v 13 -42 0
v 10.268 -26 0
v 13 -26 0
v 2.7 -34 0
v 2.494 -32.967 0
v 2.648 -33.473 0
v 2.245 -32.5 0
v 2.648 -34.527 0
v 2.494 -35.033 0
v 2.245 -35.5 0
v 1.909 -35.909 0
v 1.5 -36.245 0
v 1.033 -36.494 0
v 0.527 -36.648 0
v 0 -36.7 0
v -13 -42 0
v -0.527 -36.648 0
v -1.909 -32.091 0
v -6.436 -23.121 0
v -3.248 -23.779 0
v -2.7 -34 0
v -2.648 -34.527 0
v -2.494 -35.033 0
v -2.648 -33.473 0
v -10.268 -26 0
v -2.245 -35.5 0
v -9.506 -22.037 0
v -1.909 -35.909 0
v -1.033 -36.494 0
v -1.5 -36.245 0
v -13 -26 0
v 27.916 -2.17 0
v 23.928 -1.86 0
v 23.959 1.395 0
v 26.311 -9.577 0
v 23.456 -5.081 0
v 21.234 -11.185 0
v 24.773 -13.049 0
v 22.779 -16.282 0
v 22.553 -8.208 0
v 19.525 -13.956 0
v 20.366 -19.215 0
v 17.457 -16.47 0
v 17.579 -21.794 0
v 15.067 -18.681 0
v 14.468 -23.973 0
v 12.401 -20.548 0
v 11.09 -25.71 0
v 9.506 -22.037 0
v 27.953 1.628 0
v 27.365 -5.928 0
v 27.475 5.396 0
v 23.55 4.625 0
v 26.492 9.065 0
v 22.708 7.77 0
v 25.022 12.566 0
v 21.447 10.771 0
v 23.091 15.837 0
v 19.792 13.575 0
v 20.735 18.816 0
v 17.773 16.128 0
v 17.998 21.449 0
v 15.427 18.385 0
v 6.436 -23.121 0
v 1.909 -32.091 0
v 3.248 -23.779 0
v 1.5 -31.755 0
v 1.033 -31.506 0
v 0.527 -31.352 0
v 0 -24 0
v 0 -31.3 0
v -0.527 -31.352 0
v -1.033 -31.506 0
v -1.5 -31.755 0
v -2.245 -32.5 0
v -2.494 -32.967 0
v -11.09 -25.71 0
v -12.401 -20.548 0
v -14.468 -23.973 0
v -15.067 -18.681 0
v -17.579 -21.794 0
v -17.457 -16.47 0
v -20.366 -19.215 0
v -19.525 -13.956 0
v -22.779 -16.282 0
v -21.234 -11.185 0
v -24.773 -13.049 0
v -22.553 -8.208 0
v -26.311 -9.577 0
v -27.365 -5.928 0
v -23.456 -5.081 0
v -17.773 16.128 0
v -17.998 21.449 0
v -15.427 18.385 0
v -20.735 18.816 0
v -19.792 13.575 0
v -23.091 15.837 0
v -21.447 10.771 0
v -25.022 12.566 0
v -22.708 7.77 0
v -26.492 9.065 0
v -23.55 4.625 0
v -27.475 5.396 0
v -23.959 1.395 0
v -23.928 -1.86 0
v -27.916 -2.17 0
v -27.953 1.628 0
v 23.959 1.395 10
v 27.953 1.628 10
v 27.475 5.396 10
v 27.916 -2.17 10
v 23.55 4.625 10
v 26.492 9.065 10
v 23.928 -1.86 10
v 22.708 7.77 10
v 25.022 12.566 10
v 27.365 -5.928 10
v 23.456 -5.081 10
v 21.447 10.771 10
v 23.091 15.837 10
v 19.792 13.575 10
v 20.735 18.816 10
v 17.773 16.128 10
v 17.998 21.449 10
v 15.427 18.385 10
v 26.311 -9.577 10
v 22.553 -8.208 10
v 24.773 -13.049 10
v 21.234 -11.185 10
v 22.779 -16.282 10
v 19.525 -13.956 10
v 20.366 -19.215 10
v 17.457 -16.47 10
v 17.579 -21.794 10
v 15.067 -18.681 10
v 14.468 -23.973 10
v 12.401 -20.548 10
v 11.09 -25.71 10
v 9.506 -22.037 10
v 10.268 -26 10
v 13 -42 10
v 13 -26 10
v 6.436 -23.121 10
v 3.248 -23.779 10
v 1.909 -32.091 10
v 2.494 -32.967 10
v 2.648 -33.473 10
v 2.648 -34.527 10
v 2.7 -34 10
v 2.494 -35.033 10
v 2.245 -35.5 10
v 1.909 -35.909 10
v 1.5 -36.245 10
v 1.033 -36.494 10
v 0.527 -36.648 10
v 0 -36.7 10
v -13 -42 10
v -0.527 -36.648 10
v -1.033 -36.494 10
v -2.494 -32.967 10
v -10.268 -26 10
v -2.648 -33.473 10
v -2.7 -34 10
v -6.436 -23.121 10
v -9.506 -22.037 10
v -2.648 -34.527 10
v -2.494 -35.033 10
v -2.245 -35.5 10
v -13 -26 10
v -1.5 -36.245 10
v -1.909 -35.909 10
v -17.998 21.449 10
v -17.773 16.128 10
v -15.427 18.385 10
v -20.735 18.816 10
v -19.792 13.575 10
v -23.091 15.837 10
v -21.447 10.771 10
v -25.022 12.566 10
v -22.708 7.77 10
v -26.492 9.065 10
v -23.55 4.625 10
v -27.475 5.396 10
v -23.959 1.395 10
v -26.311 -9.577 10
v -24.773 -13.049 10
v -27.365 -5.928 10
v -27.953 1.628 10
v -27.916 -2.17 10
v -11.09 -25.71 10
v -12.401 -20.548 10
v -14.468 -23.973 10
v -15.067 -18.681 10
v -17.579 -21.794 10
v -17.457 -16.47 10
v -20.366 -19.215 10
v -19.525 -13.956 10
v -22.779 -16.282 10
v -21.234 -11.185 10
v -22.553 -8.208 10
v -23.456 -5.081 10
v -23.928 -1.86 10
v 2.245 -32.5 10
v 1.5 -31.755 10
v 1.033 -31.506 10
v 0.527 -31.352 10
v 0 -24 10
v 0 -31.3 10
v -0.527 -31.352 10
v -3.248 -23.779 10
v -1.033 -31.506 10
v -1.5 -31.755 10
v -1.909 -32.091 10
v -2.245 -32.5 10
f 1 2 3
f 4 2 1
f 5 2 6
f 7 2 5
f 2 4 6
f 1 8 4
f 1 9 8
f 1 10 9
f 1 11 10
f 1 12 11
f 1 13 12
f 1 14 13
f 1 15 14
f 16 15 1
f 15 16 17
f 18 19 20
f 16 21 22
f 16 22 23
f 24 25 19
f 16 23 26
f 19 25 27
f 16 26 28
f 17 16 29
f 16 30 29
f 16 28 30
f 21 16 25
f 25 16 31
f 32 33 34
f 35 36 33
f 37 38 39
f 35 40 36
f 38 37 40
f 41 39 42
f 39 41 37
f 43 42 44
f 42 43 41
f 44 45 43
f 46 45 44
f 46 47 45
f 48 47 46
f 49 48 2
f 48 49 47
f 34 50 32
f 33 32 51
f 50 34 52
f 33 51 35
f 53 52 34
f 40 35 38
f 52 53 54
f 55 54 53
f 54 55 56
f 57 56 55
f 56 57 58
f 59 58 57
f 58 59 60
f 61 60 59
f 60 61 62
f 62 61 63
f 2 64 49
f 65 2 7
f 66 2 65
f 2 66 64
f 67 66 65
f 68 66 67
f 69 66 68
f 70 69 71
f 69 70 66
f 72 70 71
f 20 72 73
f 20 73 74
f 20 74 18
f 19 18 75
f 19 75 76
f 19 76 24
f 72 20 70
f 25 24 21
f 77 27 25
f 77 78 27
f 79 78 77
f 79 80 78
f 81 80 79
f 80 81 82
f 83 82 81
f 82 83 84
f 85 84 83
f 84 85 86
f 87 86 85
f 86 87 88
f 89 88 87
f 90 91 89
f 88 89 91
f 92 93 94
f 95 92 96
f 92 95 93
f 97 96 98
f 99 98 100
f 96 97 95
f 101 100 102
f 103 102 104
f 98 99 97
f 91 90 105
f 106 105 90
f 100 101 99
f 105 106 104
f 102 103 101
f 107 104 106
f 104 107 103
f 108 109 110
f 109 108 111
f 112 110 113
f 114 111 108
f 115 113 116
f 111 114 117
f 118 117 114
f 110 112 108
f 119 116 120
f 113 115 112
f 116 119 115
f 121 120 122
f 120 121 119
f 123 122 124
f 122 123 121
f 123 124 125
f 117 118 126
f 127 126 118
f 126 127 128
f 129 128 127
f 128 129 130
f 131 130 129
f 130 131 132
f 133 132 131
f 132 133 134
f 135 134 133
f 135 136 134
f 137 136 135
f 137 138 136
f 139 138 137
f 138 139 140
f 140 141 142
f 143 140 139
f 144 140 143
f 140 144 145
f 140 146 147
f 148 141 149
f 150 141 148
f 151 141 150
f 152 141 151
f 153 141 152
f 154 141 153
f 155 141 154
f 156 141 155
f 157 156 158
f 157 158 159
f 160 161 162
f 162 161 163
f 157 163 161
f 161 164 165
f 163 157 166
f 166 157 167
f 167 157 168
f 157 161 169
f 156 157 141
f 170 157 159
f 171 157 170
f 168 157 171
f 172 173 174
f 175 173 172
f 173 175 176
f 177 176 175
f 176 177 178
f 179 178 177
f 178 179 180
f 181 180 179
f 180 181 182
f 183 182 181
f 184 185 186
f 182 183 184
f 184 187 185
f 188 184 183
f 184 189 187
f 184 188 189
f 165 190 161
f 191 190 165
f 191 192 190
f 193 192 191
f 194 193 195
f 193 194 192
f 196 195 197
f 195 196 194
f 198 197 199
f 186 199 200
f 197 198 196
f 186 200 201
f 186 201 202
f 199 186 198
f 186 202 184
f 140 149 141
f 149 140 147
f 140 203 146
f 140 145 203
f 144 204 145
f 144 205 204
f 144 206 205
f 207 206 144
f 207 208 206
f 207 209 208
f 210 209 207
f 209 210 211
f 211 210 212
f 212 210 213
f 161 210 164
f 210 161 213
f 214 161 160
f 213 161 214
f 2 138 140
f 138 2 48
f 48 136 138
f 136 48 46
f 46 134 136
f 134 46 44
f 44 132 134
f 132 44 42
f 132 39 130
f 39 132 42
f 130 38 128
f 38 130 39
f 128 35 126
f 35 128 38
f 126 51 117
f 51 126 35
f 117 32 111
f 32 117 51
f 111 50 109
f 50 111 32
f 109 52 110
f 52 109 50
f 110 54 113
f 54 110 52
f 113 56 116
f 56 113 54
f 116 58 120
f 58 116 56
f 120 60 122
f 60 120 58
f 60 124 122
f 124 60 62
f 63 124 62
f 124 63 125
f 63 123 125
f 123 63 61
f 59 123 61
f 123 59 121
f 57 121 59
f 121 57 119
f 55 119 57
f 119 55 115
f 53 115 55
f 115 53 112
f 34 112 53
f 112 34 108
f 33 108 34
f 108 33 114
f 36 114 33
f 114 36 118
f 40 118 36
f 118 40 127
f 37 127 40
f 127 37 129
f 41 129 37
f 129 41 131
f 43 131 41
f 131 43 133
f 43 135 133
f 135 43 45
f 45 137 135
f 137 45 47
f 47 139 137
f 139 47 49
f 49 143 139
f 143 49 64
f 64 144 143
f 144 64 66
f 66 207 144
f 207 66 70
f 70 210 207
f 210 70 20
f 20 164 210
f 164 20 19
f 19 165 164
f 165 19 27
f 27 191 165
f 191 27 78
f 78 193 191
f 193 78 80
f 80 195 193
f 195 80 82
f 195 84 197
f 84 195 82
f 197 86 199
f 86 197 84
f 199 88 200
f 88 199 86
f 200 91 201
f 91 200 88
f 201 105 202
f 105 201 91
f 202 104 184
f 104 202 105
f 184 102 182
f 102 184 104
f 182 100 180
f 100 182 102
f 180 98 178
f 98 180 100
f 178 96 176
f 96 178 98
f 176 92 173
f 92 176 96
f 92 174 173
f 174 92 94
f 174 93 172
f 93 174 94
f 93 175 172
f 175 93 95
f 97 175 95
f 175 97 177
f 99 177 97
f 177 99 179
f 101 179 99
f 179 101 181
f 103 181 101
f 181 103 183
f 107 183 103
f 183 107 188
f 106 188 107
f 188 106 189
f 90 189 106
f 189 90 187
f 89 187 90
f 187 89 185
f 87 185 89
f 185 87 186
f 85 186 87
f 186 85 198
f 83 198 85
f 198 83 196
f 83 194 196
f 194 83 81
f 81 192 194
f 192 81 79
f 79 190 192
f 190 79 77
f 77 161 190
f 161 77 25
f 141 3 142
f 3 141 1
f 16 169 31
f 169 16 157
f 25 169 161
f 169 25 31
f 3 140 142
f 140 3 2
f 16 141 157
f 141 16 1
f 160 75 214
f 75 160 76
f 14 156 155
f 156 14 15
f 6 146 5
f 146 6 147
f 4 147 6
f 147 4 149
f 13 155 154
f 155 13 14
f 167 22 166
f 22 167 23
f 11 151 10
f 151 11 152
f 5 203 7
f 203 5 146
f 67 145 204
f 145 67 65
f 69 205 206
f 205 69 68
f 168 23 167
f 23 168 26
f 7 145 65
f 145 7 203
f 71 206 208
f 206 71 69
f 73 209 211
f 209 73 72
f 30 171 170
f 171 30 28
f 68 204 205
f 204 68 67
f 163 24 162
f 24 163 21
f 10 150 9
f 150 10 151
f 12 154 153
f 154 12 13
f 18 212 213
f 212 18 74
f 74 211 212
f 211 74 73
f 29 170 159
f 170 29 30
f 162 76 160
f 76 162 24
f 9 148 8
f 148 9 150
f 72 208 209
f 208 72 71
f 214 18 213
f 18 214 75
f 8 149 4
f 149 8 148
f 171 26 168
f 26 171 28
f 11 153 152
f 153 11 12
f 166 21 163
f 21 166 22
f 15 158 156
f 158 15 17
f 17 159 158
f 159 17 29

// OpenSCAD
$fn = 32;

// ----------------------------------------------------------------------
// Spring clip: 56 mm outside, 4 mm band, 80 degree opening
// ----------------------------------------------------------------------

// --- parameters (mm) ---
outer_r = 28;             // clip outside radius
inner_r = 24;             // clip bore radius
band = 4;                 // band thickness
clip_w = 10;              // clip width
opening = 80;             // opening angle
tab_w = 26;               // tab width
tab_len = 14;             // tab length past the clip
tab_hole = 5.4;           // tab fixing hole

clip_profile = [[-17.998, 21.449], [-20.735, 18.816], [-23.091, 15.837], [-25.022, 12.566], [-26.492, 9.065], [-27.475, 5.396], [-27.953, 1.628], [-27.916, -2.17], [-27.365, -5.928], [-26.311, -9.577], [-24.773, -13.049], [-22.779, -16.282], [-20.366, -19.215], [-17.579, -21.794], [-14.468, -23.973], [-11.09, -25.71], [-7.509, -26.974], [-3.789, -27.742], [0, -28], [3.789, -27.742], [7.509, -26.974], [11.09, -25.71], [14.468, -23.973], [17.579, -21.794], [20.366, -19.215], [22.779, -16.282], [24.773, -13.049], [26.311, -9.577], [27.365, -5.928], [27.916, -2.17], [27.953, 1.628], [27.475, 5.396], [26.492, 9.065], [25.022, 12.566], [23.091, 15.837], [20.735, 18.816], [17.998, 21.449], [15.427, 18.385], [17.773, 16.128], [19.792, 13.575], [21.447, 10.771], [22.708, 7.77], [23.55, 4.625], [23.959, 1.395], [23.928, -1.86], [23.456, -5.081], [22.553, -8.208], [21.234, -11.185], [19.525, -13.956], [17.457, -16.47], [15.067, -18.681], [12.401, -20.548], [9.506, -22.037], [6.436, -23.121], [3.248, -23.779], [0, -24], [-3.248, -23.779], [-6.436, -23.121], [-9.506, -22.037], [-12.401, -20.548], [-15.067, -18.681], [-17.457, -16.47], [-19.525, -13.956], [-21.234, -11.185], [-22.553, -8.208], [-23.456, -5.081], [-23.928, -1.86], [-23.959, 1.395], [-23.55, 4.625], [-22.708, 7.77], [-21.447, 10.771], [-19.792, 13.575], [-17.773, 16.128], [-15.427, 18.385]];

difference() {
  union() {
    linear_extrude(height = clip_w) polygon(clip_profile);
    /* mounting tab, sunk 2 mm into the band */
    translate([-13, -42, 0]) cube([tab_w, 16, clip_w]);
  }
  translate([0, -34, -2.5]) cylinder(h = clip_w + 5, d = tab_hole);
}
